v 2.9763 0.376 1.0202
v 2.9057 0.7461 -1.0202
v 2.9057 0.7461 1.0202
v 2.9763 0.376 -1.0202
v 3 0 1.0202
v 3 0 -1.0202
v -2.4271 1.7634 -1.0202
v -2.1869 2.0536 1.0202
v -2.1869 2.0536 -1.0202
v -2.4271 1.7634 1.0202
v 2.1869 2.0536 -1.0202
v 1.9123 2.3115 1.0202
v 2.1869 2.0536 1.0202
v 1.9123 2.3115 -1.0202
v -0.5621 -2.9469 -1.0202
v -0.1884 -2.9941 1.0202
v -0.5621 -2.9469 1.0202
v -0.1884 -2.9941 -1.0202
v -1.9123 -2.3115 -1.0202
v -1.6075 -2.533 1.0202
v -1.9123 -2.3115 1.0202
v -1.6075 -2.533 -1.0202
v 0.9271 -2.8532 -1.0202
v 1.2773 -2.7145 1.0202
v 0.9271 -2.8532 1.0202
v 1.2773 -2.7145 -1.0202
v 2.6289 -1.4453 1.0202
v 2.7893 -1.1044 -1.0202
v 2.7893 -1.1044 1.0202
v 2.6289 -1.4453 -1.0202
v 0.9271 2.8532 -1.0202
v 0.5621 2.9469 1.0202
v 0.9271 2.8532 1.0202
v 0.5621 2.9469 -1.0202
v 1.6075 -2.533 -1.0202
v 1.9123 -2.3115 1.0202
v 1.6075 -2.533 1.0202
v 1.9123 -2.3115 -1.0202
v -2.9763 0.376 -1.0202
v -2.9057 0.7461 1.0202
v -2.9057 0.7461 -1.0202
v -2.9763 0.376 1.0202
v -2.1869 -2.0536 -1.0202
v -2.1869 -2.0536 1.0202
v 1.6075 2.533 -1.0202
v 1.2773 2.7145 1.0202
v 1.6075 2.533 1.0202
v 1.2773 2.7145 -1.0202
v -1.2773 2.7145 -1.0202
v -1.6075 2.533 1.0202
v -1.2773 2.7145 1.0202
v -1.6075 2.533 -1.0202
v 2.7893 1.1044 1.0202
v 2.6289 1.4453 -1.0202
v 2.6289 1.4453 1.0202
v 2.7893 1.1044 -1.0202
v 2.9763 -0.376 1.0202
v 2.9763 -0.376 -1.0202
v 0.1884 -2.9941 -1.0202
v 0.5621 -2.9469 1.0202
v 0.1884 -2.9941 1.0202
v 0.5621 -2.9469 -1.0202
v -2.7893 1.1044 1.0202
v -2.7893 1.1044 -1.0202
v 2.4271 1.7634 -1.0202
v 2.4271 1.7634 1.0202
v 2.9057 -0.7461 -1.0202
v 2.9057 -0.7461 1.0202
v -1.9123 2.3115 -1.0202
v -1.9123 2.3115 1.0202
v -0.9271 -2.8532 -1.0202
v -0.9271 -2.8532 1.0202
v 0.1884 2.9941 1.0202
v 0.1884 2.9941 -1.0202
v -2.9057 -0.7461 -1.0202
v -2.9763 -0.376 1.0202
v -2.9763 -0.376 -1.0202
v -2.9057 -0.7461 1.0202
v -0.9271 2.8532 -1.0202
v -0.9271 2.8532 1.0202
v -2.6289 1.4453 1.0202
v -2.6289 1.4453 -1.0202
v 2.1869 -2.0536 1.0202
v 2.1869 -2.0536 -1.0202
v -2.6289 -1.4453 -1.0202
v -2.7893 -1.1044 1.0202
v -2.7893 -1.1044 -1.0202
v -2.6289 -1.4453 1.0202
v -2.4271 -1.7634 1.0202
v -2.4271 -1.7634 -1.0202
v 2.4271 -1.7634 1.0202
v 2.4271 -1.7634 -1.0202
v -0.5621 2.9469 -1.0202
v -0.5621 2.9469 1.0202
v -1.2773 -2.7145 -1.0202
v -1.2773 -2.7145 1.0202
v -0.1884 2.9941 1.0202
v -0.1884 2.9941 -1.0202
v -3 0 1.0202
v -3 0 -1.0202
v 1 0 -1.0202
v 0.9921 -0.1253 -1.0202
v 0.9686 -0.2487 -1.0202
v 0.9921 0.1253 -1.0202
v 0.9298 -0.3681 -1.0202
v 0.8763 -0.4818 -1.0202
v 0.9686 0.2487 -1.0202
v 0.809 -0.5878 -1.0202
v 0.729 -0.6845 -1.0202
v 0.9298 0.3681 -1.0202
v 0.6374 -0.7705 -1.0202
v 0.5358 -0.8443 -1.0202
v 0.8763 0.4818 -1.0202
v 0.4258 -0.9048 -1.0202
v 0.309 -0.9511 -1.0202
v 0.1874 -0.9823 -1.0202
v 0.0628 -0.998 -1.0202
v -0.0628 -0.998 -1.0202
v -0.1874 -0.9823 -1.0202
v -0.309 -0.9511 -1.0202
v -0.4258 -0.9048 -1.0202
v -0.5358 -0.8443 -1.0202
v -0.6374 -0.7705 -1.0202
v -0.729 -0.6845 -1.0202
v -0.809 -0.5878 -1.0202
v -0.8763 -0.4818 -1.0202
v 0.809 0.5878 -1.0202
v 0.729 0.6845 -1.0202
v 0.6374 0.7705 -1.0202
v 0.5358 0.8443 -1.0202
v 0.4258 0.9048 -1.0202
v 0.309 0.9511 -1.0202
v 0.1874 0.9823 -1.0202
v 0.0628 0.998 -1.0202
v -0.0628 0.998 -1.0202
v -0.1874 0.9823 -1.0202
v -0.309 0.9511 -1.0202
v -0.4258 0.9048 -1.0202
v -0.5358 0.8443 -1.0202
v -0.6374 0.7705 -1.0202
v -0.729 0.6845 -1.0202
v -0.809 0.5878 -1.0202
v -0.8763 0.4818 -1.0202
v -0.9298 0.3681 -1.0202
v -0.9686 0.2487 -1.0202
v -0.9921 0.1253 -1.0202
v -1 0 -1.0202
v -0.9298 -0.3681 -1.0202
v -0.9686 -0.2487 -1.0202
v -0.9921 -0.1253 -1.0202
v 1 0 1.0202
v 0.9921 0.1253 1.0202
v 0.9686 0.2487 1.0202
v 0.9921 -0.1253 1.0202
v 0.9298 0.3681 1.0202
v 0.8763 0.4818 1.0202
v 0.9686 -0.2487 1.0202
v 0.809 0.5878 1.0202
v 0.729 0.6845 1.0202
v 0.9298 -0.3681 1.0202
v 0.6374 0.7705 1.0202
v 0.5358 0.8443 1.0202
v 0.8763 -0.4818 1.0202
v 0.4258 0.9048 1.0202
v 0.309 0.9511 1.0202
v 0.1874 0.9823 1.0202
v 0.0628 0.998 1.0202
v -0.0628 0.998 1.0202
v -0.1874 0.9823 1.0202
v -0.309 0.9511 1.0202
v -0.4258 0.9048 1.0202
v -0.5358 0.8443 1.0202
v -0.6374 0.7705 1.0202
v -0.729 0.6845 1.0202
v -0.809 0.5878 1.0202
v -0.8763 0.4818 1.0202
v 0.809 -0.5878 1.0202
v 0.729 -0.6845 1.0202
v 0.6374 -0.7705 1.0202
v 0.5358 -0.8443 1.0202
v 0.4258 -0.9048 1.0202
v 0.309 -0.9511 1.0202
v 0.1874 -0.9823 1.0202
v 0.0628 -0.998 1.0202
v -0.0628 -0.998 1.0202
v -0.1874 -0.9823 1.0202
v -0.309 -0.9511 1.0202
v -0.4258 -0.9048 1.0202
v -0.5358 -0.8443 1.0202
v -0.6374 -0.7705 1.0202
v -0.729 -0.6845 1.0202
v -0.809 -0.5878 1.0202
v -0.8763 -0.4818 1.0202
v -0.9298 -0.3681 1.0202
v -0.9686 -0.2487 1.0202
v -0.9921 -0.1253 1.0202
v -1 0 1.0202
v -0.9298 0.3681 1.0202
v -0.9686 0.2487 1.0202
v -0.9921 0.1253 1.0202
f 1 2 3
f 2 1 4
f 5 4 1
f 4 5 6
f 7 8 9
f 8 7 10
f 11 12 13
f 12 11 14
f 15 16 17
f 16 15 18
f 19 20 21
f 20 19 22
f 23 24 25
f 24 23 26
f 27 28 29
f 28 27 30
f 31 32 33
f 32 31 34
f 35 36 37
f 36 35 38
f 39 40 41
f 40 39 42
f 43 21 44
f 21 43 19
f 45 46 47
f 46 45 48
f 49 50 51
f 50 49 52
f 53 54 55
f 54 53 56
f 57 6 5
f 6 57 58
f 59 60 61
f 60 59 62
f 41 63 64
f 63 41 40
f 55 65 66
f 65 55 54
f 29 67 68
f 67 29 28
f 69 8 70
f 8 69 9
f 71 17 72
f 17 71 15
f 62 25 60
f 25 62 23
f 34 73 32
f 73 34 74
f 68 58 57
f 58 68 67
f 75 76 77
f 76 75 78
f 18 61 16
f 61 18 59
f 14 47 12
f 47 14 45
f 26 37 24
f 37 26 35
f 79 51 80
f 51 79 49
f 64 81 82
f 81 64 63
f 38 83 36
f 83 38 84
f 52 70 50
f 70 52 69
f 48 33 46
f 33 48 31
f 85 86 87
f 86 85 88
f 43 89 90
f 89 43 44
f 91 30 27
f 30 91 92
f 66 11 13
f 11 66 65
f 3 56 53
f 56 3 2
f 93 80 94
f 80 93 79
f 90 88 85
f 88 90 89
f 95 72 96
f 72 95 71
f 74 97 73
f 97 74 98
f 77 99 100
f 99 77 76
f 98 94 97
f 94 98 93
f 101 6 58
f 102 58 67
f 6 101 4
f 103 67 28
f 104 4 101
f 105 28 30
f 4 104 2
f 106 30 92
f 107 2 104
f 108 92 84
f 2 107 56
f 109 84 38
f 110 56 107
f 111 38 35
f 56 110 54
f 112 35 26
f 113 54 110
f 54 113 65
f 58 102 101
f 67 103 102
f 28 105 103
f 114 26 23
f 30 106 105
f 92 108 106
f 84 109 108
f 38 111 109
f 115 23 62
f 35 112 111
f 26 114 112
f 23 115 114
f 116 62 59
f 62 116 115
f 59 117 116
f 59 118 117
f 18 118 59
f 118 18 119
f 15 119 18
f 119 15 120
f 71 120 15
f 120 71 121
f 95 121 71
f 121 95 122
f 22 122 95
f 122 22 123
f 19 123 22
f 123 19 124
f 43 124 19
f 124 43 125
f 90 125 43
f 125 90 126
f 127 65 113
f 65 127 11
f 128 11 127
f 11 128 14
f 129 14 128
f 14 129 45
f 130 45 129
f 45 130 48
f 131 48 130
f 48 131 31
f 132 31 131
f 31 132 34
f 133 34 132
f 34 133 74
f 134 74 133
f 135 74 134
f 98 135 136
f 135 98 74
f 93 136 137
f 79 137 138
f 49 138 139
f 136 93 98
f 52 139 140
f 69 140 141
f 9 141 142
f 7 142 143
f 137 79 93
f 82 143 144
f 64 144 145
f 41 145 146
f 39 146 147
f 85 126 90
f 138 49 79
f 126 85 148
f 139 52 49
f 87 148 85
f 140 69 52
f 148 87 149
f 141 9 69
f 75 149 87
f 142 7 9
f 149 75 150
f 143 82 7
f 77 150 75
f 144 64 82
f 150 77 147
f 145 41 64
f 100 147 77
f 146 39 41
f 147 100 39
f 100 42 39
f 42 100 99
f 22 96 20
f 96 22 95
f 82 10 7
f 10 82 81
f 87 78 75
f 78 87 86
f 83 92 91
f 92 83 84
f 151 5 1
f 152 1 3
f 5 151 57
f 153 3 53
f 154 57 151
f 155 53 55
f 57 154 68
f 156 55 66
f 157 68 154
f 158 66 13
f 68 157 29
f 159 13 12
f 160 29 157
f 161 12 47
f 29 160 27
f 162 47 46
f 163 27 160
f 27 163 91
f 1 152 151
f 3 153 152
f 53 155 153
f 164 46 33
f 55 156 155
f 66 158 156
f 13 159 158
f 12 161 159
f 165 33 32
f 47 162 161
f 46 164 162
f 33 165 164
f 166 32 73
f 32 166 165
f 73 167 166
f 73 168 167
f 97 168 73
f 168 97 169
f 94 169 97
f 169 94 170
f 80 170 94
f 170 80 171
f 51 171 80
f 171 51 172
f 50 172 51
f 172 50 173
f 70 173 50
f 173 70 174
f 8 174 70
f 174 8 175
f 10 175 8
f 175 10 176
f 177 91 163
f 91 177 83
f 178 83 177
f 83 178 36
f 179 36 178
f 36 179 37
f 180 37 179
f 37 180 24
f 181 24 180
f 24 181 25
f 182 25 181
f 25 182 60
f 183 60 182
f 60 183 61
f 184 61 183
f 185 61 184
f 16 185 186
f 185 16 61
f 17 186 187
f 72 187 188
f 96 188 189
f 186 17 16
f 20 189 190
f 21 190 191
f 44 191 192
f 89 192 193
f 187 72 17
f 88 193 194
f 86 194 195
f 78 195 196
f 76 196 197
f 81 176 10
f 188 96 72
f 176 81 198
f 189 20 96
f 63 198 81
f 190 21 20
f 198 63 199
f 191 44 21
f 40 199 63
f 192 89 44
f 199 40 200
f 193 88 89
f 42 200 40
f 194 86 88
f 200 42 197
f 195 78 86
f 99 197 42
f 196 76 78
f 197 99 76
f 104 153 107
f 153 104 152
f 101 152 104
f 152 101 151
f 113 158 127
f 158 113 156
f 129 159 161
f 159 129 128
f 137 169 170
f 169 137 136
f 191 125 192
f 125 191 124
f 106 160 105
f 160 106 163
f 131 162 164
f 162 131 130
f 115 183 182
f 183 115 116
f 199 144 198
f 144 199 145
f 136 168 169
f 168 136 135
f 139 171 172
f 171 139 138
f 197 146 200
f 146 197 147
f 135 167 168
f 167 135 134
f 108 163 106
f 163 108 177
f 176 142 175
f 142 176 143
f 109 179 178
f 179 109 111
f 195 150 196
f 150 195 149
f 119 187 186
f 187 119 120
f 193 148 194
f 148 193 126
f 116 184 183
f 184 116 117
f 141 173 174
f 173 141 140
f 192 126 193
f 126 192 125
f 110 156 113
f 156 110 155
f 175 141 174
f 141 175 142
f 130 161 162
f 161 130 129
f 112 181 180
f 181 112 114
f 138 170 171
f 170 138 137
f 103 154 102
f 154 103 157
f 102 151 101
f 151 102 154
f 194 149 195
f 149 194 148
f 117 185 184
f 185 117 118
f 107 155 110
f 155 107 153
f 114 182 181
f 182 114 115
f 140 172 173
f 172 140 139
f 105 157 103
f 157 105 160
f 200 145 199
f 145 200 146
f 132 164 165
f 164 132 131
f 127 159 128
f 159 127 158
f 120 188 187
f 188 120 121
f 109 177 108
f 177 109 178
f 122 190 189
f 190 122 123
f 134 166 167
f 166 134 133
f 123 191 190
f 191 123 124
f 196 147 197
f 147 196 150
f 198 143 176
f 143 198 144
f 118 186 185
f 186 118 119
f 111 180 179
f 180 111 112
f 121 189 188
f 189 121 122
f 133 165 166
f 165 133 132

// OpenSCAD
// file: parameters.scad
$fn = 50;
spoke_length = 10; // 10
spoke_thickness = 3; // 7
spoke_width = 2;
spoke_hole_r = 1.0;
wheel_num = 9;
num_wheels = wheel_num;
hole_offset = 0; // -2

bead_adjust = -2.8; // Adjustment for beads
bead_offset = -1.6; // Manually fine tune this parameter! Moves beads a certain amount
bead_diameter = 6;
bead_length = sqrt(spoke_length^2 + spoke_length^2 - 2*(spoke_length^2)*cos(360/wheel_num)) - spoke_width + bead_adjust;

shaft_radius = 1.0 + 0.1;
// main file
include <parameters.scad>
module bead() {
    difference() {
    cylinder(r = bead_diameter/2, h = bead_length, center = true);
    cylinder(r = spoke_hole_r, h = bead_length, center = true);
    }
}
bead();
//scale([1, 1, bead_length/4])
  //sphere(r = bead_diameter/2, $fn = 100);
